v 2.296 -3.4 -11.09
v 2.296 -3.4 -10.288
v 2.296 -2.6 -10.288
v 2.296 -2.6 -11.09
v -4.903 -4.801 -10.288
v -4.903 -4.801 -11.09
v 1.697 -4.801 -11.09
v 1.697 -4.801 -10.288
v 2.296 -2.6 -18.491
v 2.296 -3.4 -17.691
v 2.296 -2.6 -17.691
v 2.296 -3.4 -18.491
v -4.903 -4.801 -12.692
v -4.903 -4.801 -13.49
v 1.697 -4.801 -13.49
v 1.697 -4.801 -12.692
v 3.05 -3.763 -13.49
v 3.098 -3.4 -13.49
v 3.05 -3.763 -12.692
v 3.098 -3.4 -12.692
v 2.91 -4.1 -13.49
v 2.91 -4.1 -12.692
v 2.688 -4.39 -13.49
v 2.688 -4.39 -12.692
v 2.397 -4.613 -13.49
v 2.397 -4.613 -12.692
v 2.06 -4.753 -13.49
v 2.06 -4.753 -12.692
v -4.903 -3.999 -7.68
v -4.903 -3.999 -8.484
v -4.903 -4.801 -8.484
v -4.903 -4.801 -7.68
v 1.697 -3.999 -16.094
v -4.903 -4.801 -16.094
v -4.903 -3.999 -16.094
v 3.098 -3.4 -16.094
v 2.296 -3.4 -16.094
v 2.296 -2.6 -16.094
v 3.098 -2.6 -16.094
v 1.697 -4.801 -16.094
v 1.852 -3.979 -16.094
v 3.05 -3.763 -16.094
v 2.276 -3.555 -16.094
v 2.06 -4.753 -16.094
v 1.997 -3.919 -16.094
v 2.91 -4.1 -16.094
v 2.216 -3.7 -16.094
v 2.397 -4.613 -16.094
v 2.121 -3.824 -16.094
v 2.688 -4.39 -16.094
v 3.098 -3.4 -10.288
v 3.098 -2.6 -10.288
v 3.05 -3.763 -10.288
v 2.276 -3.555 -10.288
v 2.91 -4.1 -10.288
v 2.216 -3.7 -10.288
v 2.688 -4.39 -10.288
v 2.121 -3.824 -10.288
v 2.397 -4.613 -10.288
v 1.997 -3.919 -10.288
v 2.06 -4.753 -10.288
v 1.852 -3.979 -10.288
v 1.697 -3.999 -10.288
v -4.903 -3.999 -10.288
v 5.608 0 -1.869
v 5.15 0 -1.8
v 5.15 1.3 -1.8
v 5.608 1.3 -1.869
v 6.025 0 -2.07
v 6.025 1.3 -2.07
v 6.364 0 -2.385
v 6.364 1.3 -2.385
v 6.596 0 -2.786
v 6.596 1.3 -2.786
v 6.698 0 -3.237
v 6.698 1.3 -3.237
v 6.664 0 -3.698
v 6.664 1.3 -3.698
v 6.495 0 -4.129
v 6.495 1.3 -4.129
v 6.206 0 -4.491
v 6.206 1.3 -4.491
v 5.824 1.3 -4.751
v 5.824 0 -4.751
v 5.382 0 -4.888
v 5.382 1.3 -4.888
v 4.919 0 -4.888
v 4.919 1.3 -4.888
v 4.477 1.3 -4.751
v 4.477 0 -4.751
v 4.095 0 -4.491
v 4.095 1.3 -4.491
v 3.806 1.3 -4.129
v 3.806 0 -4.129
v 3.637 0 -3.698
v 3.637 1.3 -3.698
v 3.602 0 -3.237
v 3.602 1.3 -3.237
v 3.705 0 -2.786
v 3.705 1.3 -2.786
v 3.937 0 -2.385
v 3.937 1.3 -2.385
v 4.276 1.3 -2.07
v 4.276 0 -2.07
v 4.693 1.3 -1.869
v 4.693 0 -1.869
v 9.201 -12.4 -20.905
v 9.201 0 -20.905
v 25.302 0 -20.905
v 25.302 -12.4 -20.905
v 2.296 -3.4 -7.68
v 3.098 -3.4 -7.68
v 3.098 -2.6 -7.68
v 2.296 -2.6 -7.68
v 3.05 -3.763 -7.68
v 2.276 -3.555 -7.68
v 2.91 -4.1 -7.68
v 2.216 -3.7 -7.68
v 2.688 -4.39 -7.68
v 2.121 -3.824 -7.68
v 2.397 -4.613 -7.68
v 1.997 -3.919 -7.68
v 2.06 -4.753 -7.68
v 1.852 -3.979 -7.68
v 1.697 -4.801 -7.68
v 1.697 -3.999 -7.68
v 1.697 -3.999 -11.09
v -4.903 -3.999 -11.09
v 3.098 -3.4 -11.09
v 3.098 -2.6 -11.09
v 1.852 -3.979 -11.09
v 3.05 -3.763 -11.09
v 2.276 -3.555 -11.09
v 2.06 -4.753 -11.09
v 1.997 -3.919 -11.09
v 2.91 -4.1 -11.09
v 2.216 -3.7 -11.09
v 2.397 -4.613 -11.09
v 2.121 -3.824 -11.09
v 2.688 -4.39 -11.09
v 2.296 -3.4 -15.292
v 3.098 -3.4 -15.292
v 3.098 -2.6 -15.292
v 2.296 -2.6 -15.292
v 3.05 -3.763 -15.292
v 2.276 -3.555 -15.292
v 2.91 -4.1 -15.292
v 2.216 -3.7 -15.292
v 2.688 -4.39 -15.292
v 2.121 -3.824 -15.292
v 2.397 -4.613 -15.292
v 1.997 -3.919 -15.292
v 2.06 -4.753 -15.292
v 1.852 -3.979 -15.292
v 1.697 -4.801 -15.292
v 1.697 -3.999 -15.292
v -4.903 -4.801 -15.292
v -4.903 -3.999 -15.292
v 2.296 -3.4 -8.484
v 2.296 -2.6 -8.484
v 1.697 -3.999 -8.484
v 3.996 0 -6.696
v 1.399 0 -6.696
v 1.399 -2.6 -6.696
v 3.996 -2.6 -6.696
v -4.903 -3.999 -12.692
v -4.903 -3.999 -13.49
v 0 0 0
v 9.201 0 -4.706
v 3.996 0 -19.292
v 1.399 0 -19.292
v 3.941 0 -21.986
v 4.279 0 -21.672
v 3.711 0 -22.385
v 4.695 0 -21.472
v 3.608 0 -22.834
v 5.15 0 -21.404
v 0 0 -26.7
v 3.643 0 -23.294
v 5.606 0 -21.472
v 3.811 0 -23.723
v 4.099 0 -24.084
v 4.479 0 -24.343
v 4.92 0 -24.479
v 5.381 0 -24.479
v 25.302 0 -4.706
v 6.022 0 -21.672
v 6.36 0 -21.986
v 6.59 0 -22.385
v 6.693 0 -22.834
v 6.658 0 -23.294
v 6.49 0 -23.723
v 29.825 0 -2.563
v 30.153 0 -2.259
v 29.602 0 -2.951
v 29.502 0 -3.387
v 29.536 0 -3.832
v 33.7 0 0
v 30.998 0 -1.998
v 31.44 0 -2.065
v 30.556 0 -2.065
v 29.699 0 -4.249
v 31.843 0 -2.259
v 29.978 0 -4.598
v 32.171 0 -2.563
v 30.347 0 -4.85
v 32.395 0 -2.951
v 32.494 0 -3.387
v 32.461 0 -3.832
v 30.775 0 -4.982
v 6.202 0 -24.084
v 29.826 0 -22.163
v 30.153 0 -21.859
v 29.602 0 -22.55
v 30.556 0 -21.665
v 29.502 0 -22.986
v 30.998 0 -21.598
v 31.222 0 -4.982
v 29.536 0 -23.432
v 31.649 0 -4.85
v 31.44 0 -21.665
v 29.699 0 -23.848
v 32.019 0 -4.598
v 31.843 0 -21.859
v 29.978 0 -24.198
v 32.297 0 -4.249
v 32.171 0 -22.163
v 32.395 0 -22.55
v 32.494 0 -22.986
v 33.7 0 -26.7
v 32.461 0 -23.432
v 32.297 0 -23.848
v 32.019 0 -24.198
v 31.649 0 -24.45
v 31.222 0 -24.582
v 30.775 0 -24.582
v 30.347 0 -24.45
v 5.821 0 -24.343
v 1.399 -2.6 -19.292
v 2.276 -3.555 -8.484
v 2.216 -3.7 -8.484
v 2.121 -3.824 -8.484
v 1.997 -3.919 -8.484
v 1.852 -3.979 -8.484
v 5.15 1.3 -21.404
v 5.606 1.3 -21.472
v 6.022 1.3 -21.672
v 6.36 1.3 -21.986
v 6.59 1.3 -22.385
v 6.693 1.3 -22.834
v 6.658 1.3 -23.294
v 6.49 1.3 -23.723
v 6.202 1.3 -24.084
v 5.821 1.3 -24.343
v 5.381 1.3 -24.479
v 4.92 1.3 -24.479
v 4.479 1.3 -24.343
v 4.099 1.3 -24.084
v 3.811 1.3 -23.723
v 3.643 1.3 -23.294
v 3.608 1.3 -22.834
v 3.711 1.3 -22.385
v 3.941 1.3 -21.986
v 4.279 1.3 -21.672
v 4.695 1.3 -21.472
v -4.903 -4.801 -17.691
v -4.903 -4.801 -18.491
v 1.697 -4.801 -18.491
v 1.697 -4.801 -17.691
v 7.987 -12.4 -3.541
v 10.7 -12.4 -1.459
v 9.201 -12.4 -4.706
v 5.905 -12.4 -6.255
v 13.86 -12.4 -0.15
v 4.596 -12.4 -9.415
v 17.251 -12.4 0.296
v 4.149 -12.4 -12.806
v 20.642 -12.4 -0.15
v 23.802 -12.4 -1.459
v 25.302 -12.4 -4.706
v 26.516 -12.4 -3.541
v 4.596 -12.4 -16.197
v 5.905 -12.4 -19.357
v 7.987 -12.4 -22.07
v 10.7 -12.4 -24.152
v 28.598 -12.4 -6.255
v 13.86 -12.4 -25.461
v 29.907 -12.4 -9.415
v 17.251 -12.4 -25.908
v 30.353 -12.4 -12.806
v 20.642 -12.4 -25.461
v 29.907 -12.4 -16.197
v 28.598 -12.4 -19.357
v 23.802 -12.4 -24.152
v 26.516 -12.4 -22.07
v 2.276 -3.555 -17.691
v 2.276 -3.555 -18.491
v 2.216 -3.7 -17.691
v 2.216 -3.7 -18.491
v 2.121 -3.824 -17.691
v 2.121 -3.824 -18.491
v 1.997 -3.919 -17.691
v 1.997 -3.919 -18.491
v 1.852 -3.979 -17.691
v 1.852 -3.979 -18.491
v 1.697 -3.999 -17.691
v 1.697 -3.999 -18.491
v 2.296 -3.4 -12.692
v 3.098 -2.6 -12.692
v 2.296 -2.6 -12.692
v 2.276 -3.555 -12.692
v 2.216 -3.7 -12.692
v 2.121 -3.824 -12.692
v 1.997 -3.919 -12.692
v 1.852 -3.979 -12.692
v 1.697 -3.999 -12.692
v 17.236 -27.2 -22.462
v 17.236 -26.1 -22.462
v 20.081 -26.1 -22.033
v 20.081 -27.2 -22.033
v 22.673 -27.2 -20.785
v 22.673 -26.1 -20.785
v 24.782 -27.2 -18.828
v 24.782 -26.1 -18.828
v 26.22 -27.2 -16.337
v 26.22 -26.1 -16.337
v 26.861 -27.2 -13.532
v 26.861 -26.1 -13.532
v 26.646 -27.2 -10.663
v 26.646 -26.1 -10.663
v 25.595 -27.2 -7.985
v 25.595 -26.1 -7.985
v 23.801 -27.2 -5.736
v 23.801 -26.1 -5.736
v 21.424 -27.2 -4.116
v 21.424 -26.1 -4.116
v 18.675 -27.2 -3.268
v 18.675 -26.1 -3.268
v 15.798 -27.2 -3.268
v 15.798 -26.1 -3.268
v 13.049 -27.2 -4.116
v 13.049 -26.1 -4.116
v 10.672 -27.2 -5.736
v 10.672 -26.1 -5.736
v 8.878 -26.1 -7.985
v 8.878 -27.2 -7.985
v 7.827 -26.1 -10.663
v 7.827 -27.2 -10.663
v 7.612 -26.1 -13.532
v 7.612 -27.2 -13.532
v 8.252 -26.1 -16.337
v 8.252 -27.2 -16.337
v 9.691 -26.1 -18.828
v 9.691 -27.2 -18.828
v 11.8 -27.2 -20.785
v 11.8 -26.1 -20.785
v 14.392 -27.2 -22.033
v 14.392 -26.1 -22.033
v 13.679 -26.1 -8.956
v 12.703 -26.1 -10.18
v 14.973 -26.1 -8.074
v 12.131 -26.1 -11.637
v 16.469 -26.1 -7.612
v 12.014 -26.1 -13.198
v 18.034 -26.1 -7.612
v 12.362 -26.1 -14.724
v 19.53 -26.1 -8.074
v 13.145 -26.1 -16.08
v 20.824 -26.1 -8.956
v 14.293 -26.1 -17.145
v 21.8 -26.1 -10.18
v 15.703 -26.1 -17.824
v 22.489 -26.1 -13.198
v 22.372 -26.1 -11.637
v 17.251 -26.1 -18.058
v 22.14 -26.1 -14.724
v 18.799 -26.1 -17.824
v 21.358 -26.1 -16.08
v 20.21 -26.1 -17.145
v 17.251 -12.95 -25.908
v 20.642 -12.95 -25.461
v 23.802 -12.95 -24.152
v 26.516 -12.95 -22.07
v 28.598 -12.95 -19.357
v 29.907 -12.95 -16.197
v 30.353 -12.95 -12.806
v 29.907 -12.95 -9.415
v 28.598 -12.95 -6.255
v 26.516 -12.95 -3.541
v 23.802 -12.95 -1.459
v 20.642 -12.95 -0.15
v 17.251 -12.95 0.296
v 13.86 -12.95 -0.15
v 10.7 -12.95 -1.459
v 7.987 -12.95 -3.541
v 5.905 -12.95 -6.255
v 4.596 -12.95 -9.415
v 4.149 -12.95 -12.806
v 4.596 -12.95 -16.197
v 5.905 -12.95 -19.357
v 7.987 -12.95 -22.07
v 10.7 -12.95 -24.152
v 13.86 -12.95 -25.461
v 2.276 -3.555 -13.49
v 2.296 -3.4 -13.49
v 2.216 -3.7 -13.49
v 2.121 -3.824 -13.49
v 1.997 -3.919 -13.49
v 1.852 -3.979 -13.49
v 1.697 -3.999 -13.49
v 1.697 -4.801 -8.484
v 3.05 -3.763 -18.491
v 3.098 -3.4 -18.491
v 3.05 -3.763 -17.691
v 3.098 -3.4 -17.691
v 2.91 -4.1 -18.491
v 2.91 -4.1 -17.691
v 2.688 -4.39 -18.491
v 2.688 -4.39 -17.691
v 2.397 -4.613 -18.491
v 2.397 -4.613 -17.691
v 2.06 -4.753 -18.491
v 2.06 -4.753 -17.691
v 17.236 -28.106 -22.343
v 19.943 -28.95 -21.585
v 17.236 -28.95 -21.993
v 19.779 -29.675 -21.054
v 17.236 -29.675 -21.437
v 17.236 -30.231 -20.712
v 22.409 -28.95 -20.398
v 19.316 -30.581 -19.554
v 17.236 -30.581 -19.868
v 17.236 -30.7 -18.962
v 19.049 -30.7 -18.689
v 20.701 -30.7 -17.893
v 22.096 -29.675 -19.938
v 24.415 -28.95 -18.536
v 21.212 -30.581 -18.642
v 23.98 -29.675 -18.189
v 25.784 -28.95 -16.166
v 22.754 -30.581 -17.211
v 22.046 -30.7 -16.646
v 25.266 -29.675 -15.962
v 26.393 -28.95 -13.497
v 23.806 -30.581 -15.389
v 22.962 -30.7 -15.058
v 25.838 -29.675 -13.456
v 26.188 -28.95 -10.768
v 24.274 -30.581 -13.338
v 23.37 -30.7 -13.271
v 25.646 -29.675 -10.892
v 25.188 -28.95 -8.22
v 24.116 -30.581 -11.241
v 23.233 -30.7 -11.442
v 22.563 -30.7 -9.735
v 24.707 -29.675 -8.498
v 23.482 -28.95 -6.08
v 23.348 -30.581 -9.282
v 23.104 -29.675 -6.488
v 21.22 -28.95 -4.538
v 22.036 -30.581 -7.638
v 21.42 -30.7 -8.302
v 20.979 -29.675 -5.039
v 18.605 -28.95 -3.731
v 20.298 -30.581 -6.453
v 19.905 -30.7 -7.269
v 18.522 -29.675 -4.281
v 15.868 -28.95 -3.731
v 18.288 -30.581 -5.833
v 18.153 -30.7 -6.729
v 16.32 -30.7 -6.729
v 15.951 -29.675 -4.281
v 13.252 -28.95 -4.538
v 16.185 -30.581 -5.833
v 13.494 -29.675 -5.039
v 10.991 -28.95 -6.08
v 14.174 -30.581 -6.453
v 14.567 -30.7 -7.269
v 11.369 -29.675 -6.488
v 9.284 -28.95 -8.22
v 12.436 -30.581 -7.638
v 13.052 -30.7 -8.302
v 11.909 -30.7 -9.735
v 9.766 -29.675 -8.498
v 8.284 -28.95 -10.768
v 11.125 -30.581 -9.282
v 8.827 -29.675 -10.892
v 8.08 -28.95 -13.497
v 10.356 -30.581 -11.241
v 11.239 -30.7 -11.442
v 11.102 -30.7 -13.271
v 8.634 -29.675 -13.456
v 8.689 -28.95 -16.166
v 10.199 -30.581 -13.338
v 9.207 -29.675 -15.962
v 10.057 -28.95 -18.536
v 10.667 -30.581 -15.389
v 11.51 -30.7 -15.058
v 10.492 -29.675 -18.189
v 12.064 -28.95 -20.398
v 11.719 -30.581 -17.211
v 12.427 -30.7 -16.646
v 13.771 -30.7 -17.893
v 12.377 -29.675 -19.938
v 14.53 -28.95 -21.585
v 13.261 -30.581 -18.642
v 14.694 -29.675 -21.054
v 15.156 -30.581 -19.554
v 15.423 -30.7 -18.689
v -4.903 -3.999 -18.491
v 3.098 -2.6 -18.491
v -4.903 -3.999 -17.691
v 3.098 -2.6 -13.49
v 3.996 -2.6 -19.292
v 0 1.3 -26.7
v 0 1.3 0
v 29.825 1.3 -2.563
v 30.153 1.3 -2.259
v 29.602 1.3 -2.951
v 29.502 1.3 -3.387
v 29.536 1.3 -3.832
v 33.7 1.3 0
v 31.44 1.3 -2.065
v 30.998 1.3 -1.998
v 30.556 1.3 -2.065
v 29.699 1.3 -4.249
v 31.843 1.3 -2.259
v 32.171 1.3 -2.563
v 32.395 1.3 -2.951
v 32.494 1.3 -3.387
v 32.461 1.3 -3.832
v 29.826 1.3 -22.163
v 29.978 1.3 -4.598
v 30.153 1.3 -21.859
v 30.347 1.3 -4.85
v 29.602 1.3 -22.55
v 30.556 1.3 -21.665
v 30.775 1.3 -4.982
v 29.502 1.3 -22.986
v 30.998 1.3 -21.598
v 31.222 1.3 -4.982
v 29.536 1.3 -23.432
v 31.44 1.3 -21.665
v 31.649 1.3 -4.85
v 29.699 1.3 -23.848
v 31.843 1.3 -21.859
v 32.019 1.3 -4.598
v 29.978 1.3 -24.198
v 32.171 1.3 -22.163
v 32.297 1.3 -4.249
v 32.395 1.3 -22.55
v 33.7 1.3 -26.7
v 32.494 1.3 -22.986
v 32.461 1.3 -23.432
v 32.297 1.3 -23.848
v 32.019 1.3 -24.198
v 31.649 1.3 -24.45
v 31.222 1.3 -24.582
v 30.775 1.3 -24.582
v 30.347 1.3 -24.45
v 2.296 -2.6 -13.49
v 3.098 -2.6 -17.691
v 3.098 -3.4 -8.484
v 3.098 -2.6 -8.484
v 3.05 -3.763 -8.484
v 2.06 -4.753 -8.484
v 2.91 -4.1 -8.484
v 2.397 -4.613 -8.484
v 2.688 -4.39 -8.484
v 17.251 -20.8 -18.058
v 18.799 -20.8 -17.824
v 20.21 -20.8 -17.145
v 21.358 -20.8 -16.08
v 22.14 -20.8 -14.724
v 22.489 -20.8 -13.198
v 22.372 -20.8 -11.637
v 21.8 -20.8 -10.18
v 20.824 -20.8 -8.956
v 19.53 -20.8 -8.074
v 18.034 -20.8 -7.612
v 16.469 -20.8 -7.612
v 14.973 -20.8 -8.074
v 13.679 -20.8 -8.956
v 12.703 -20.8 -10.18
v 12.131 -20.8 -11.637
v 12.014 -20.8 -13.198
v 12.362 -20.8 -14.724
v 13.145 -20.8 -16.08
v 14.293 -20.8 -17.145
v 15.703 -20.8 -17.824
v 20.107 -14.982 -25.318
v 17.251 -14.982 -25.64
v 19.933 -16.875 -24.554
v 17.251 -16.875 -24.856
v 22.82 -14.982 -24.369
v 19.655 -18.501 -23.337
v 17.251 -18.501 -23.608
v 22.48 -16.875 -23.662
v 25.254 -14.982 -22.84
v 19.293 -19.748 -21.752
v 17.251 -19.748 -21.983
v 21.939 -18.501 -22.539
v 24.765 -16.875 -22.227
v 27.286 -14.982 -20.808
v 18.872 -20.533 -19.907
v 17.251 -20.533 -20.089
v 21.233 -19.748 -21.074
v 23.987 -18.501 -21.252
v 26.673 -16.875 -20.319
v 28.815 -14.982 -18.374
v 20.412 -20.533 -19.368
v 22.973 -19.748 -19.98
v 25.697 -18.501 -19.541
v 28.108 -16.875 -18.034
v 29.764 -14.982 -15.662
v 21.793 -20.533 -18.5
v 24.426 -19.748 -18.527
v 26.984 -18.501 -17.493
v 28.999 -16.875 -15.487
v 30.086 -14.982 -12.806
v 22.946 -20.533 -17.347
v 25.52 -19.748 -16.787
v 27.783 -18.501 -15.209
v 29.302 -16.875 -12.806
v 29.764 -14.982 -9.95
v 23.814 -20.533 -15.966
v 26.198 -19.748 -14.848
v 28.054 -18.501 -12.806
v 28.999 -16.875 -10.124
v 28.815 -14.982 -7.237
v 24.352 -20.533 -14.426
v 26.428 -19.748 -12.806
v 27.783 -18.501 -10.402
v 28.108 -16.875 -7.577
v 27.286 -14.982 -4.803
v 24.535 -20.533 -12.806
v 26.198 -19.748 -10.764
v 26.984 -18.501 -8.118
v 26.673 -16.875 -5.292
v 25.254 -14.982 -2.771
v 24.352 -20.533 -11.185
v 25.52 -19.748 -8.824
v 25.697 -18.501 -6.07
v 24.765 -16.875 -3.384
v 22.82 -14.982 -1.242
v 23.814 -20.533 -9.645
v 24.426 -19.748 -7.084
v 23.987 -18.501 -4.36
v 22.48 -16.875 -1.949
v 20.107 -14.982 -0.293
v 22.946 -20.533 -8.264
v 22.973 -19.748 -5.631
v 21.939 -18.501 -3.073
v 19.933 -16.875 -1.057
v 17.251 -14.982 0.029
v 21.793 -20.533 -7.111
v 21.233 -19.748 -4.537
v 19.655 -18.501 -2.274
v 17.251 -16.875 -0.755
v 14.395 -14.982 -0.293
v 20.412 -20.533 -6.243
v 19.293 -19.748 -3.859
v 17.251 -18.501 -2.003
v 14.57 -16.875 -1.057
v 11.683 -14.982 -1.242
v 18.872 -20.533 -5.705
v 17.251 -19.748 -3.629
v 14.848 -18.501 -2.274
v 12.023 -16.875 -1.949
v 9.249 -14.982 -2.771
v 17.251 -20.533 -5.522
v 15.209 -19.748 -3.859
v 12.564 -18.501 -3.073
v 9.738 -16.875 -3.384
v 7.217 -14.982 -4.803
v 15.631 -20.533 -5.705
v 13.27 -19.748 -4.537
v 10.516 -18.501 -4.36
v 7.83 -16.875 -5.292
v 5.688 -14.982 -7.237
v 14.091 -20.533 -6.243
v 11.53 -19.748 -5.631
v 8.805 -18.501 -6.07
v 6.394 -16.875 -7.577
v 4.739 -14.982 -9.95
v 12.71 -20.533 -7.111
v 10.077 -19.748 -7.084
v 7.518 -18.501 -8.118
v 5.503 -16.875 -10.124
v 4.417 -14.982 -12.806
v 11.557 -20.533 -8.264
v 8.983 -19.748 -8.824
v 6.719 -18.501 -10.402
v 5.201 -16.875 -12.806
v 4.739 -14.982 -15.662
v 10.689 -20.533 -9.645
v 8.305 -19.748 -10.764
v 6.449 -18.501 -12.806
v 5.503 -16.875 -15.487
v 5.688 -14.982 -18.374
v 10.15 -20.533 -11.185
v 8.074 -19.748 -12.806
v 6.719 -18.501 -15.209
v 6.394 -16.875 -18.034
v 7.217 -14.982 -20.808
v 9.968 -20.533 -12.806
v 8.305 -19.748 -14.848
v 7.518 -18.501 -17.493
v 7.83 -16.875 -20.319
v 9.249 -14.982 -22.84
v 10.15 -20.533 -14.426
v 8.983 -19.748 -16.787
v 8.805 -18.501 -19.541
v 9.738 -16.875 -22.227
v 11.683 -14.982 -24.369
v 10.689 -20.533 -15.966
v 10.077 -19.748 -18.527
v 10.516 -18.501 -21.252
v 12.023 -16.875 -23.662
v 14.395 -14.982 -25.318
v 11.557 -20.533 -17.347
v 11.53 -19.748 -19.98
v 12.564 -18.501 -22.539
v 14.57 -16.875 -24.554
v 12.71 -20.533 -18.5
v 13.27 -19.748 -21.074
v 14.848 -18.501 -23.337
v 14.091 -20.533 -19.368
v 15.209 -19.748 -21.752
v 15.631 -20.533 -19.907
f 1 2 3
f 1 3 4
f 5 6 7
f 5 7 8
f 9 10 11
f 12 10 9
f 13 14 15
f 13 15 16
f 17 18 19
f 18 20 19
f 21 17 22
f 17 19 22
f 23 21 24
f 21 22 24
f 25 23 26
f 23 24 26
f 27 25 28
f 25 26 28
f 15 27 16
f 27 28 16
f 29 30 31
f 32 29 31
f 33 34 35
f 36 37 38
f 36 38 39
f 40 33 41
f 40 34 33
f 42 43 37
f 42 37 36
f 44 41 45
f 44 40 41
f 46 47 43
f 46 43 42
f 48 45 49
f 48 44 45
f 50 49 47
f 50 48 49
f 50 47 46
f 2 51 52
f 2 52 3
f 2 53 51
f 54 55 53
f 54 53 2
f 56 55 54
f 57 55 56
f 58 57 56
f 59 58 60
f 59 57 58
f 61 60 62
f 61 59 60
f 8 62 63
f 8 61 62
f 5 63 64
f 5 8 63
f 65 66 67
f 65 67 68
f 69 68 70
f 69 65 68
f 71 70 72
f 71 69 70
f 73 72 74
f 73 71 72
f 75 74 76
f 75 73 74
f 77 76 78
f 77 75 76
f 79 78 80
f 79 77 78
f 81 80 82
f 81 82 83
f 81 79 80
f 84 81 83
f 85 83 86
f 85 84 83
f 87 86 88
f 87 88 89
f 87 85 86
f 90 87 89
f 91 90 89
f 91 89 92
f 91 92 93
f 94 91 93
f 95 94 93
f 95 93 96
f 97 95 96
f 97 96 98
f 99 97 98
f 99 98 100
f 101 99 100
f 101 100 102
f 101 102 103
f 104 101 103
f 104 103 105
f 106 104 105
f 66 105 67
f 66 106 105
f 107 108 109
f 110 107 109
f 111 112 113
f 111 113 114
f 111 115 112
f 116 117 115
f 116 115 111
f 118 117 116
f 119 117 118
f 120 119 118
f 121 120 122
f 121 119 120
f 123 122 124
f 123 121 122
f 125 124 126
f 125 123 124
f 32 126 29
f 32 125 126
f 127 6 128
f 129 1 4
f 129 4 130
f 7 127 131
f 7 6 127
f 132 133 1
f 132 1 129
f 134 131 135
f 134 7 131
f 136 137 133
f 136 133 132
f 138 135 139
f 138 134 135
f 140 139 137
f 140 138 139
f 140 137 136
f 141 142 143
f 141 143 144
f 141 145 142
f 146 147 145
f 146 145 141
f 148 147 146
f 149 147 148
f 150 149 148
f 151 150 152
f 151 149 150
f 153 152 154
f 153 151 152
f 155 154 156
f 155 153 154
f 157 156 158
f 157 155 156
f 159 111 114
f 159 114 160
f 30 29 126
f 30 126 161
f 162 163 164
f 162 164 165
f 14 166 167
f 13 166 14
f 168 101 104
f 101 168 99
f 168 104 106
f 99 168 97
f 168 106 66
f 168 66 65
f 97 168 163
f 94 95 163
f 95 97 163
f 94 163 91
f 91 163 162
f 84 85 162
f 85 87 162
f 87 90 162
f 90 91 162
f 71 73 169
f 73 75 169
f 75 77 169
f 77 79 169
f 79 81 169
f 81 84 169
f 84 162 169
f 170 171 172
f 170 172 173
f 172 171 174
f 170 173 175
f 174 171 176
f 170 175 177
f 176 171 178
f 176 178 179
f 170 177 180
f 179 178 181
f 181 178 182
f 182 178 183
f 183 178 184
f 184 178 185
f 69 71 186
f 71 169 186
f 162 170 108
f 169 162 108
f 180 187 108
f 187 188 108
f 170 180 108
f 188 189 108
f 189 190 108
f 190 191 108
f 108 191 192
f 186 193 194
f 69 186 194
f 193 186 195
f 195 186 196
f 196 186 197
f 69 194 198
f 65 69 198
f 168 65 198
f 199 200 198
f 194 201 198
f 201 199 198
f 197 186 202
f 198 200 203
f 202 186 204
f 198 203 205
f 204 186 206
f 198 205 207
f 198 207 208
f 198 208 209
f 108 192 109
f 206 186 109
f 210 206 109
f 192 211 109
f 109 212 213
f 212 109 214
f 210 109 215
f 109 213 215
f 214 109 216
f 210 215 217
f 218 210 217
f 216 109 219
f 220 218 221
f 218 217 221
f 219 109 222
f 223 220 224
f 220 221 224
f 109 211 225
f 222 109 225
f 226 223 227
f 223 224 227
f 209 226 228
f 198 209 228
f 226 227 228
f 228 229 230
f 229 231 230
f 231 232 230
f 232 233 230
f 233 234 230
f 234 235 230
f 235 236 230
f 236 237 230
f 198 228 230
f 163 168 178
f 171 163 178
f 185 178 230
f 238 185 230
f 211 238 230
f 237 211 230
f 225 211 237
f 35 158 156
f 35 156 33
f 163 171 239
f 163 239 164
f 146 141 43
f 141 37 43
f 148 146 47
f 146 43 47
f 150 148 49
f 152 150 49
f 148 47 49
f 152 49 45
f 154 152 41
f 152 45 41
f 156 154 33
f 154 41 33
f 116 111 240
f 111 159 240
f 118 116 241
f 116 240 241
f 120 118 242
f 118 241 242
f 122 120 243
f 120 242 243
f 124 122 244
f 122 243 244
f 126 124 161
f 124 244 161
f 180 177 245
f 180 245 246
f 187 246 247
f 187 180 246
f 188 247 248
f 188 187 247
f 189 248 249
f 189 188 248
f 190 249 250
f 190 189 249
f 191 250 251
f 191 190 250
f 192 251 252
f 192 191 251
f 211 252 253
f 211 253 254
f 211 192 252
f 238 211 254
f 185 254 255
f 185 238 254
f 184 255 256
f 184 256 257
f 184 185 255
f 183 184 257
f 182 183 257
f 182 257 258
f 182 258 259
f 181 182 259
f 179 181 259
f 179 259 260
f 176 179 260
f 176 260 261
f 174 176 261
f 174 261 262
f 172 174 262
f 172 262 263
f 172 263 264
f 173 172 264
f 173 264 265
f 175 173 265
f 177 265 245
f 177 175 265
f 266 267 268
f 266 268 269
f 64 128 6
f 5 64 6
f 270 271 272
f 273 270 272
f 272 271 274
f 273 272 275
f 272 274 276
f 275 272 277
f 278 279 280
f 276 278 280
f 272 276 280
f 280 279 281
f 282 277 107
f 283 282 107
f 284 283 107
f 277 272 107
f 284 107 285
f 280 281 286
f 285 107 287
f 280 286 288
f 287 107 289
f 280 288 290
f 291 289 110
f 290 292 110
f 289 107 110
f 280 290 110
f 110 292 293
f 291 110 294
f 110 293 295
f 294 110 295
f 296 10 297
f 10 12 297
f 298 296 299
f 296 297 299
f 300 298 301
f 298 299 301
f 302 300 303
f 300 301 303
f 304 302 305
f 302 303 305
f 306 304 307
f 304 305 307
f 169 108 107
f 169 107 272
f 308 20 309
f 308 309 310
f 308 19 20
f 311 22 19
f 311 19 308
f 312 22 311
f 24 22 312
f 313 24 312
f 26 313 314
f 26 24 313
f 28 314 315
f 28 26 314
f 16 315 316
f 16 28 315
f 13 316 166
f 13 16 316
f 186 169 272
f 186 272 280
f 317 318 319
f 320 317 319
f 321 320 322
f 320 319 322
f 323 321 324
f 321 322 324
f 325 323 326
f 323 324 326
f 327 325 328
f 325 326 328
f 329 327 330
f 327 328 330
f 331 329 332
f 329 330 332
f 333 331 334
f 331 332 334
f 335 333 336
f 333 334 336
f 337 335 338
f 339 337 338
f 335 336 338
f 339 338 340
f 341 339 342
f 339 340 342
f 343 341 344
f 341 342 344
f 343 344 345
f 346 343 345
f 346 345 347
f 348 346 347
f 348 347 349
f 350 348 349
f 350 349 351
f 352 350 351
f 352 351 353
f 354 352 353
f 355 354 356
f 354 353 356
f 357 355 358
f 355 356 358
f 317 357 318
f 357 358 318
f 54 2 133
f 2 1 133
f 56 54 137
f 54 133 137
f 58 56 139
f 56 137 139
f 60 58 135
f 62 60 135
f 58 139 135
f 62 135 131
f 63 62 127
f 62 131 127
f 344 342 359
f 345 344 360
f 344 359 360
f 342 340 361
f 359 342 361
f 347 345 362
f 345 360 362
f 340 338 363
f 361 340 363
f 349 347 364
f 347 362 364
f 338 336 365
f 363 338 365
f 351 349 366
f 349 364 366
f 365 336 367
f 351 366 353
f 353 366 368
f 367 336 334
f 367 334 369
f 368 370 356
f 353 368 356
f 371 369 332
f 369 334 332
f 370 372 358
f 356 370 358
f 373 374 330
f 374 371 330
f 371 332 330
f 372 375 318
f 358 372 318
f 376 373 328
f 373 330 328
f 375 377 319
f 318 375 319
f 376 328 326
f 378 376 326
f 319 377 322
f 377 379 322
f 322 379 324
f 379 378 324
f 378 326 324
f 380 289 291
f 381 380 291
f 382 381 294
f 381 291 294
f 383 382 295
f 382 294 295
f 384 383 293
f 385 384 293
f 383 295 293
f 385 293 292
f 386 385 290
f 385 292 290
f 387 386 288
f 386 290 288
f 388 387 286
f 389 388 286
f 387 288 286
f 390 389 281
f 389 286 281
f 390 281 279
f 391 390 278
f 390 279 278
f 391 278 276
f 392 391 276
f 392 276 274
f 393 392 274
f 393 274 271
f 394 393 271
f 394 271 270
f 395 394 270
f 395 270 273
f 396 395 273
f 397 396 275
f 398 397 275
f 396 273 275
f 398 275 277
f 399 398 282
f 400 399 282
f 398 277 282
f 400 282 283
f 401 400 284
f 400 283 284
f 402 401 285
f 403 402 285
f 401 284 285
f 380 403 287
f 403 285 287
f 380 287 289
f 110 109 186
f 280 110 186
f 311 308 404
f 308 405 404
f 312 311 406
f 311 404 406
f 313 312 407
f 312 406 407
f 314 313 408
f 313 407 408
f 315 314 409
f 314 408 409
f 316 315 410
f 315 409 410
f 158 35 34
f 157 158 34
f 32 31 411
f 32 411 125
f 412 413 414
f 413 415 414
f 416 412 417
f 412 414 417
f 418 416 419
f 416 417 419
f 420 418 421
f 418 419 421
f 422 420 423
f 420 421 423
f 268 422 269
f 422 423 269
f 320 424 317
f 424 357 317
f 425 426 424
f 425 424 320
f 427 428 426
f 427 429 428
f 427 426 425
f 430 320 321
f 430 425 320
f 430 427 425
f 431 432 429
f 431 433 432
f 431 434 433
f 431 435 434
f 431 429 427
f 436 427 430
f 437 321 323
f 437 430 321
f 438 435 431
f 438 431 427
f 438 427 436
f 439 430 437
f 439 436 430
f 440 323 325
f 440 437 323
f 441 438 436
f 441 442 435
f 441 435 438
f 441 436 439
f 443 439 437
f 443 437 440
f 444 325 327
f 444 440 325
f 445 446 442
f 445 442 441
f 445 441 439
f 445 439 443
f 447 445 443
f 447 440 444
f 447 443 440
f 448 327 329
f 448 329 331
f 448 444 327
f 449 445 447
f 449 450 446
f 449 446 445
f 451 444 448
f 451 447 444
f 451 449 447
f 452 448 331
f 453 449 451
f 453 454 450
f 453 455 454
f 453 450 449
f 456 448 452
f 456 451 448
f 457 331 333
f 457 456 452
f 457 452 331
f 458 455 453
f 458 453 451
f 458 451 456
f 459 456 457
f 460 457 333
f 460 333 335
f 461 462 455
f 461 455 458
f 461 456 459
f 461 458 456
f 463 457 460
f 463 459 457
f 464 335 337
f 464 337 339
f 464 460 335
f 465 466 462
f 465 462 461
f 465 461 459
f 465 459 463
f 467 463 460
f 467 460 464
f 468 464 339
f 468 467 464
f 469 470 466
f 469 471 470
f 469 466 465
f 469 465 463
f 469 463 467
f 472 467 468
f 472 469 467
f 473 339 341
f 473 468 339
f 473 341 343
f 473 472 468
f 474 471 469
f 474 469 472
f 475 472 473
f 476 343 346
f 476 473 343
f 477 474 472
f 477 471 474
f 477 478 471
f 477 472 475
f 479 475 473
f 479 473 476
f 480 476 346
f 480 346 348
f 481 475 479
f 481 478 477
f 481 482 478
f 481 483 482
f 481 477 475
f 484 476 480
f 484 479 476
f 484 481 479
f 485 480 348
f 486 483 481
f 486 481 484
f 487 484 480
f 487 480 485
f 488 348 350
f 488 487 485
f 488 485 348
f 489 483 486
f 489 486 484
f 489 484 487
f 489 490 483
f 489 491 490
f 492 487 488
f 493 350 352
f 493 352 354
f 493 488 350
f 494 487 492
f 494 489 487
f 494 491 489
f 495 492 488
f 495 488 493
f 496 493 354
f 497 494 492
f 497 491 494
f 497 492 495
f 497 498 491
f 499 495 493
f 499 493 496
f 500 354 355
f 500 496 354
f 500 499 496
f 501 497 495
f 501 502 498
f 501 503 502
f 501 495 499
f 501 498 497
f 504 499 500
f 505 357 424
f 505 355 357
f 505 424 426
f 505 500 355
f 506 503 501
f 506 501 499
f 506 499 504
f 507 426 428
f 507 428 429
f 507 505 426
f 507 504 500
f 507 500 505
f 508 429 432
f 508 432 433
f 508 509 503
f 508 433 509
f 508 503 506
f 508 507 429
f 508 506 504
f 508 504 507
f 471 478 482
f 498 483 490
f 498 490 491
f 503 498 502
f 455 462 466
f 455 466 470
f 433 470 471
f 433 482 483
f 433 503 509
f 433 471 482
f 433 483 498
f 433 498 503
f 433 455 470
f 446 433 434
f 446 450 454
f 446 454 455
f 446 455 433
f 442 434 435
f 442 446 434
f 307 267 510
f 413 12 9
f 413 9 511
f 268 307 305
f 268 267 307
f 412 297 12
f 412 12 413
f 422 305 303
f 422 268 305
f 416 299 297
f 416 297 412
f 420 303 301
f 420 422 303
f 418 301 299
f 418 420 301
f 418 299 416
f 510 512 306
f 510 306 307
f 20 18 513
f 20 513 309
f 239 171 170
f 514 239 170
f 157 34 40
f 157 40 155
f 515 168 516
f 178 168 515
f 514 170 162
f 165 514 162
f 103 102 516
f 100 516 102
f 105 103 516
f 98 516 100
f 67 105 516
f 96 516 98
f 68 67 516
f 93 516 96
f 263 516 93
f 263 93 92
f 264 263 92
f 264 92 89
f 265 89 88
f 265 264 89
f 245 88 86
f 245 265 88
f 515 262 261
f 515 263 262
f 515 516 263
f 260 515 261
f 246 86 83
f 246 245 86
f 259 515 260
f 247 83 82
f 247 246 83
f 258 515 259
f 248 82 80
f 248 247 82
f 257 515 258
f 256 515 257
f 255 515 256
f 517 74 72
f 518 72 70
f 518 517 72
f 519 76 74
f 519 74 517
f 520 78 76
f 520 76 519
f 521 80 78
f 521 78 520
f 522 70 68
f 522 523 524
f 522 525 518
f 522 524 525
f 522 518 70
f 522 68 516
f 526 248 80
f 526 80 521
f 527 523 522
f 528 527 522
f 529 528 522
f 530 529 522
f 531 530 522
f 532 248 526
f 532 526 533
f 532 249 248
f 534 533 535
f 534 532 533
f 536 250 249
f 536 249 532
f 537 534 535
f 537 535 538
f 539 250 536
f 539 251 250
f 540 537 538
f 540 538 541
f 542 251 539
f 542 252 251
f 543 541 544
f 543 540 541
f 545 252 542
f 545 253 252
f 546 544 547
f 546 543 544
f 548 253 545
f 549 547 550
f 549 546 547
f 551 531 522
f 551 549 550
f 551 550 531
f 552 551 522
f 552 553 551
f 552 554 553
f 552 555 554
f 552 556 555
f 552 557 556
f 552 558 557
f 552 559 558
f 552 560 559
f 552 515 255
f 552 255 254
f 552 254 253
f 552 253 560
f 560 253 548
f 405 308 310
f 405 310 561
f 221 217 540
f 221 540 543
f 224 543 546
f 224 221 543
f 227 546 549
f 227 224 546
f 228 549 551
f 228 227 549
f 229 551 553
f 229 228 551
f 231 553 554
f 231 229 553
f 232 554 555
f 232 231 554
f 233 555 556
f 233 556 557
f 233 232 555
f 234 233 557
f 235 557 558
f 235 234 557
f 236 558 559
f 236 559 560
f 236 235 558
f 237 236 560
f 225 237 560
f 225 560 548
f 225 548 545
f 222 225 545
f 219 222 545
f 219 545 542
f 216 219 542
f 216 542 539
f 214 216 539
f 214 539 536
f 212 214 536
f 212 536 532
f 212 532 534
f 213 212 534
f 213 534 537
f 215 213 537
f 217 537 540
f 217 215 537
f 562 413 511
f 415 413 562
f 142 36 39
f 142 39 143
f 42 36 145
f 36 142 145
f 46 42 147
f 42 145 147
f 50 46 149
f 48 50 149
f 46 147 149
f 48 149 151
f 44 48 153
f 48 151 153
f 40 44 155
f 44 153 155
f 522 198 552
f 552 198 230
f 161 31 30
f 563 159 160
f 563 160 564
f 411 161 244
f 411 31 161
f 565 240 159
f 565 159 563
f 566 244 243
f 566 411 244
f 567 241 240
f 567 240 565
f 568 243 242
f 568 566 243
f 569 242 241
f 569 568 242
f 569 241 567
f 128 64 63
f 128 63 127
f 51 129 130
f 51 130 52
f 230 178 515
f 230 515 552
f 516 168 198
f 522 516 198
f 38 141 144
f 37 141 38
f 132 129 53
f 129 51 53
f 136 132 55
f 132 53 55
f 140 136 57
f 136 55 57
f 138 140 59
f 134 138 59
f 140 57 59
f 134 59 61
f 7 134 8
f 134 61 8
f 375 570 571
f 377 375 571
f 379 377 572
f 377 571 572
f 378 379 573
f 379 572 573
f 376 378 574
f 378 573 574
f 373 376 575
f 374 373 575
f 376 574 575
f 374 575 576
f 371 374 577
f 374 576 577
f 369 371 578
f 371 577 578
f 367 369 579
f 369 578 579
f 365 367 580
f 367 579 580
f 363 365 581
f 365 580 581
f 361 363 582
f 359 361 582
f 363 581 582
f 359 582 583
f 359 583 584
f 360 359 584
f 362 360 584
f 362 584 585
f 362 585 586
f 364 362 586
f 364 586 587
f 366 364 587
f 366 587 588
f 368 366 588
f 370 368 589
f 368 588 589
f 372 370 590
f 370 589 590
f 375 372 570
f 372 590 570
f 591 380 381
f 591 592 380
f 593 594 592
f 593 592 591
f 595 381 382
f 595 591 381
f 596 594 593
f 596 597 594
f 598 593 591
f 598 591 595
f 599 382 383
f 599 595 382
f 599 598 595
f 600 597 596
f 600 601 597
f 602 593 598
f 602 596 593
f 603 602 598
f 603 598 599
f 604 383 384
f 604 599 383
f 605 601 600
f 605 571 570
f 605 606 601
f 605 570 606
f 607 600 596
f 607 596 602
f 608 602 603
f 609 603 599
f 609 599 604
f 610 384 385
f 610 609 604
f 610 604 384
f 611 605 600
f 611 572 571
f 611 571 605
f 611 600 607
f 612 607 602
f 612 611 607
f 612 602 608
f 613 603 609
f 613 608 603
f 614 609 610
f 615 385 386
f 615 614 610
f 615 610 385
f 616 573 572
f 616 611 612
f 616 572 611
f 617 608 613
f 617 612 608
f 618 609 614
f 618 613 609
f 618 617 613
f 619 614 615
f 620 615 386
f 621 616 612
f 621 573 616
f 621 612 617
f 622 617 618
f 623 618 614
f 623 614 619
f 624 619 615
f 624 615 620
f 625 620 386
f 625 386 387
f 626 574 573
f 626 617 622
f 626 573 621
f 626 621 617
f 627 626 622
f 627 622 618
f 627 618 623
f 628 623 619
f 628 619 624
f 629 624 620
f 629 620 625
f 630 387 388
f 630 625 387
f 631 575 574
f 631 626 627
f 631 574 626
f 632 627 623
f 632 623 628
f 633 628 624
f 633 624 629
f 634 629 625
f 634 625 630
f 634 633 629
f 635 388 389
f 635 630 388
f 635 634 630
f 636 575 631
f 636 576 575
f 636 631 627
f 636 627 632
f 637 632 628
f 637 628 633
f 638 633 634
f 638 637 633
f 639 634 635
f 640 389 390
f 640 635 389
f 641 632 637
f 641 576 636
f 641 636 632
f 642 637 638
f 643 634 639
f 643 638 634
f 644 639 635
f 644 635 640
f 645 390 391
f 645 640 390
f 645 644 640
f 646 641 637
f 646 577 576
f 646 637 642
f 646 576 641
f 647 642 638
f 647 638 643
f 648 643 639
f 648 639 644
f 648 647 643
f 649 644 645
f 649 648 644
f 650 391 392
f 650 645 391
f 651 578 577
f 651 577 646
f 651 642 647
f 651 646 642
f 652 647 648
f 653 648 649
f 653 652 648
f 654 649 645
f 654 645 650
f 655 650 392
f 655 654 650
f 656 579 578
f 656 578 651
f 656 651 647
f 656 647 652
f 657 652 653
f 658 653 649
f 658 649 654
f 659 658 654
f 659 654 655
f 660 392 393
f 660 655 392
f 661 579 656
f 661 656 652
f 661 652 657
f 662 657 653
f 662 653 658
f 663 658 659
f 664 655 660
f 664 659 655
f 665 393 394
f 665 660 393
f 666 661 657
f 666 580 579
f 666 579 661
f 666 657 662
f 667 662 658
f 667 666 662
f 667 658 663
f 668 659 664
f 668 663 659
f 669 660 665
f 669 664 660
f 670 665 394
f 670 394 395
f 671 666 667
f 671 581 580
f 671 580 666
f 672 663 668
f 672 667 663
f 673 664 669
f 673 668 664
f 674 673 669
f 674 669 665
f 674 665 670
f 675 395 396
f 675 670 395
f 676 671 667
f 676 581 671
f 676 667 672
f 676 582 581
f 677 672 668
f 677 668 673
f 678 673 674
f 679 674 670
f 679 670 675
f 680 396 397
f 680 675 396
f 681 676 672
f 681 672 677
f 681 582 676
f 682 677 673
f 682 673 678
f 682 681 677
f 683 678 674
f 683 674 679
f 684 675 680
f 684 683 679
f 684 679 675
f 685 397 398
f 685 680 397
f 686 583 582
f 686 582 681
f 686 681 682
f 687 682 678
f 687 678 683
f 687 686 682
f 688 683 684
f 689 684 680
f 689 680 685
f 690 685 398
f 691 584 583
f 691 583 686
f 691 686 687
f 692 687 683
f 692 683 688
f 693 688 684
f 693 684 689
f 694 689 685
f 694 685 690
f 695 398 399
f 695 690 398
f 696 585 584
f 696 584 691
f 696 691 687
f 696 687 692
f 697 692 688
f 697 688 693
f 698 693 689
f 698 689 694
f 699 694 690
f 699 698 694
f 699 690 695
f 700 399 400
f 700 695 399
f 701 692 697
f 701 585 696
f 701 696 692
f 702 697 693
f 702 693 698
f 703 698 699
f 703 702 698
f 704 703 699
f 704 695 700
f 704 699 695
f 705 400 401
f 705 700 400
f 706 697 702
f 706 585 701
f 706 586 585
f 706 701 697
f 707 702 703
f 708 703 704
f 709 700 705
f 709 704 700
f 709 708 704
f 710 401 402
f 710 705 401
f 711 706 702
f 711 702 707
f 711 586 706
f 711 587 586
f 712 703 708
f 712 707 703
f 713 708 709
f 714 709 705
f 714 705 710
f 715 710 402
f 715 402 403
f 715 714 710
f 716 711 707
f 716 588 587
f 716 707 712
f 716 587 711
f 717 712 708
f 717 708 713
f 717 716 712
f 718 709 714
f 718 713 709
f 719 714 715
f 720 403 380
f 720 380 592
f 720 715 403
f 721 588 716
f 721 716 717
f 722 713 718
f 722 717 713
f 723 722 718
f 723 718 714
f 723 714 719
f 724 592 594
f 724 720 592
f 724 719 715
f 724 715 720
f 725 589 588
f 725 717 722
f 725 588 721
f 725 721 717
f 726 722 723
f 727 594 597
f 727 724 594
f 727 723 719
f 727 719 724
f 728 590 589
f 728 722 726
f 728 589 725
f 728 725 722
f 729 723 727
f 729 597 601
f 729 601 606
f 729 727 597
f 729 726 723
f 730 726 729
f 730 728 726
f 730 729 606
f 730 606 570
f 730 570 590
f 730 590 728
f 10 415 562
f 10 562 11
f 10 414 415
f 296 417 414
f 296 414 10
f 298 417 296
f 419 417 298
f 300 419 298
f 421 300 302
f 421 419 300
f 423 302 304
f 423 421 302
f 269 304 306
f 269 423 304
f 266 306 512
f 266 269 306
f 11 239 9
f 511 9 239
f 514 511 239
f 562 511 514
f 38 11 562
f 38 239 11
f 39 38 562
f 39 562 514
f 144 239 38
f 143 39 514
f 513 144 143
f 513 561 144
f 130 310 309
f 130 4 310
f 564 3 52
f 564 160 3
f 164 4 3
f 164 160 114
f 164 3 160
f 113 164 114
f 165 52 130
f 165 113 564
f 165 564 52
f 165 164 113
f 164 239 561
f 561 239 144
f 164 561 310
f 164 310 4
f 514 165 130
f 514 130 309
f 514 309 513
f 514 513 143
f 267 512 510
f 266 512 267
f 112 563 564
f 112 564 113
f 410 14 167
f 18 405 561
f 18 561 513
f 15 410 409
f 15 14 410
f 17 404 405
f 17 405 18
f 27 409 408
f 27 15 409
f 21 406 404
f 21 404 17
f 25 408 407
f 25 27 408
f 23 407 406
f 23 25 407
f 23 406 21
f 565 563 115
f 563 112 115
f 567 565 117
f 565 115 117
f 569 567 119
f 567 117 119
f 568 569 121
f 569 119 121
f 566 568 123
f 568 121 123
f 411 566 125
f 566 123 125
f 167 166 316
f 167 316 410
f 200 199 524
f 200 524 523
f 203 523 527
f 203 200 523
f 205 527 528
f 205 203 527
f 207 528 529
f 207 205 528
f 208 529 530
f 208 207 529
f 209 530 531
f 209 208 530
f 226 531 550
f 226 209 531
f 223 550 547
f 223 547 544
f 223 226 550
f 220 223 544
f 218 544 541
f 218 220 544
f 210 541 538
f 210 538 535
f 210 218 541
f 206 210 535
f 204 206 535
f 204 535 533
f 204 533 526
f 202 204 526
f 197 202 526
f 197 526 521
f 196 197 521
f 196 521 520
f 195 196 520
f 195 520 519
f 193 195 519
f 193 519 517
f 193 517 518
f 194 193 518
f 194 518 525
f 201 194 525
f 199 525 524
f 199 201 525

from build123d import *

# Parameters (mm, degrees)
SKETCH_1_W      = 33.7
SKETCH_1_H      = 26.7
SKETCH_1_R      = 1.500160794
SKETCH_1_R_2    = 1.5
SKETCH_1_R_3    = 1.552324123
SKETCH_1_R_4    = 1.546482565
EXTRUDE_1_DEPTH = 1.3
SKETCH_2_W      = 2.597810981
SKETCH_2_H      = 12.596422695
EXTRUDE_3_DEPTH = 2.6
SKETCH_3_W      = 0.801502227
SKETCH_3_H      = 0.800416217
SKETCH_3_H_2    = 0.802091773
SKETCH_3_H_3    = 0.798469443
SKETCH_3_H_4    = 0.802947908
SKETCH_3_H_5    = 0.804334784
SKETCH_6_W      = 16.101670469
SKETCH_6_H      = 16.19878198
EXTRUDE_4_DEPTH = 12.4
SKETCH_7_R      = 13.101940721
EXTRUDE_5_DEPTH = 8.4
FILLET_1_R      = 7.85
SKETCH_9_R      = 5.251940721
EXTRUDE_6_DEPTH = 5.3
SKETCH_12_R     = 9.651169133
EXTRUDE_8_DEPTH = 4.6
FILLET_2_R      = 3.5


with BuildPart() as part:
    # Эскиз1 → Бобышка-Вытянуть1 (new body)
    with BuildSketch(Plane(origin=(0, 0, 0), x_dir=(1, 0, 0), z_dir=(0, 1, 0))):
        with Locations((16.85, 13.35)):
            Rectangle(SKETCH_1_W, SKETCH_1_H)
        with Locations(Location((30.998263896, 3.498646338, 0), (0, 0, 270))):
            Circle(SKETCH_1_R, mode=Mode.SUBTRACT)
        with Locations(Location((30.998263896, 23.098469173, 0), (0, 0, 270))):
            Circle(SKETCH_1_R_2, mode=Mode.SUBTRACT)
        with Locations(Location((5.150482455, 3.352746683, 0), (0, 0, 270))):
            Circle(SKETCH_1_R_3, mode=Mode.SUBTRACT)
        with Locations(Location((5.150482455, 22.950000581, 0), (0, 0, 270))):
            Circle(SKETCH_1_R_4, mode=Mode.SUBTRACT)
    extrude(amount=EXTRUDE_1_DEPTH)

    # Эскиз2 → Бобышка-Вытянуть3 (add)
    with BuildSketch(Plane.XZ):
        with Locations((2.697533257, -12.993800664)):
            Rectangle(SKETCH_2_W, SKETCH_2_H)
    extrude(amount=EXTRUDE_3_DEPTH)

    # По траектории3: sweep along a path in Эскиз4
    with BuildLine(Plane.XY) as sweep_3_path:
        Line((2.697117024, -2.6), (2.697117024, -3.4))
        ThreePointArc((2.697117024, -3.4), (2.404223805, -4.107106781), (1.697117024, -4.4))
        Line((1.697117024, -4.4), (-4.903035907, -4.4))
    # Эскиз3 → По траектории3 (sweep)
    with BuildSketch(Plane.XZ.offset(2.6)):
        with Locations((2.697117024, -18.090816879)):
            Rectangle(SKETCH_3_W, SKETCH_3_H)
        with Locations((2.697117024, -15.69317288)):
            Rectangle(SKETCH_3_W, SKETCH_3_H_2)
        with Locations((2.697117024, -13.090941171)):
            Rectangle(SKETCH_3_W, SKETCH_3_H_3)
        with Locations((2.697117024, -10.688983068)):
            Rectangle(SKETCH_3_W, SKETCH_3_H_4)
        with Locations((2.697117024, -8.082021693)):
            Rectangle(SKETCH_3_W, SKETCH_3_H_5)
    sweep(path=sweep_3_path.line)

    # Эскиз6 → Бобышка-Вытянуть4 (add)
    with BuildSketch(Plane.XZ):
        with Locations((17.251381143, -12.805593049)):
            Rectangle(SKETCH_6_W, SKETCH_6_H)
    extrude(amount=EXTRUDE_4_DEPTH)

    # Эскиз7 → Бобышка-Вытянуть5 (add)
    with BuildSketch(Plane.XZ.offset(12.4)):
        with Locations(Location((17.251381142, -12.805593049, 0), (0, 0, 270))):
            Circle(SKETCH_7_R)
    extrude(amount=EXTRUDE_5_DEPTH)

    # Скругление1
    fillet_1_edges = [part.edges().sort_by_distance(p)[0] for p in [
        (17.251381142, -20.8, 0.296347672),
    ]]
    fillet(fillet_1_edges, radius=FILLET_1_R)

    # Эскиз9 → Бобышка-Вытянуть6 (add)
    with BuildSketch(Plane.XZ.offset(20.8)):
        with Locations(Location((17.251381142, -12.805593049, 0), (0, 0, 270))):
            Circle(SKETCH_9_R)
    extrude(amount=EXTRUDE_6_DEPTH)

    # Эскиз12 → Бобышка-Вытянуть8 (add)
    with BuildSketch(Plane.XZ.offset(26.1)):
        with Locations(Location((17.236348133, -12.810976669, 0), (0, 0, 270))):
            Circle(SKETCH_12_R)
    extrude(amount=EXTRUDE_8_DEPTH)

    # Скругление2
    fillet_2_edges = [part.edges().sort_by_distance(p)[0] for p in [
        (17.236348133, -30.7, -3.159807536),
    ]]
    fillet(fillet_2_edges, radius=FILLET_2_R)


solid = part.part
